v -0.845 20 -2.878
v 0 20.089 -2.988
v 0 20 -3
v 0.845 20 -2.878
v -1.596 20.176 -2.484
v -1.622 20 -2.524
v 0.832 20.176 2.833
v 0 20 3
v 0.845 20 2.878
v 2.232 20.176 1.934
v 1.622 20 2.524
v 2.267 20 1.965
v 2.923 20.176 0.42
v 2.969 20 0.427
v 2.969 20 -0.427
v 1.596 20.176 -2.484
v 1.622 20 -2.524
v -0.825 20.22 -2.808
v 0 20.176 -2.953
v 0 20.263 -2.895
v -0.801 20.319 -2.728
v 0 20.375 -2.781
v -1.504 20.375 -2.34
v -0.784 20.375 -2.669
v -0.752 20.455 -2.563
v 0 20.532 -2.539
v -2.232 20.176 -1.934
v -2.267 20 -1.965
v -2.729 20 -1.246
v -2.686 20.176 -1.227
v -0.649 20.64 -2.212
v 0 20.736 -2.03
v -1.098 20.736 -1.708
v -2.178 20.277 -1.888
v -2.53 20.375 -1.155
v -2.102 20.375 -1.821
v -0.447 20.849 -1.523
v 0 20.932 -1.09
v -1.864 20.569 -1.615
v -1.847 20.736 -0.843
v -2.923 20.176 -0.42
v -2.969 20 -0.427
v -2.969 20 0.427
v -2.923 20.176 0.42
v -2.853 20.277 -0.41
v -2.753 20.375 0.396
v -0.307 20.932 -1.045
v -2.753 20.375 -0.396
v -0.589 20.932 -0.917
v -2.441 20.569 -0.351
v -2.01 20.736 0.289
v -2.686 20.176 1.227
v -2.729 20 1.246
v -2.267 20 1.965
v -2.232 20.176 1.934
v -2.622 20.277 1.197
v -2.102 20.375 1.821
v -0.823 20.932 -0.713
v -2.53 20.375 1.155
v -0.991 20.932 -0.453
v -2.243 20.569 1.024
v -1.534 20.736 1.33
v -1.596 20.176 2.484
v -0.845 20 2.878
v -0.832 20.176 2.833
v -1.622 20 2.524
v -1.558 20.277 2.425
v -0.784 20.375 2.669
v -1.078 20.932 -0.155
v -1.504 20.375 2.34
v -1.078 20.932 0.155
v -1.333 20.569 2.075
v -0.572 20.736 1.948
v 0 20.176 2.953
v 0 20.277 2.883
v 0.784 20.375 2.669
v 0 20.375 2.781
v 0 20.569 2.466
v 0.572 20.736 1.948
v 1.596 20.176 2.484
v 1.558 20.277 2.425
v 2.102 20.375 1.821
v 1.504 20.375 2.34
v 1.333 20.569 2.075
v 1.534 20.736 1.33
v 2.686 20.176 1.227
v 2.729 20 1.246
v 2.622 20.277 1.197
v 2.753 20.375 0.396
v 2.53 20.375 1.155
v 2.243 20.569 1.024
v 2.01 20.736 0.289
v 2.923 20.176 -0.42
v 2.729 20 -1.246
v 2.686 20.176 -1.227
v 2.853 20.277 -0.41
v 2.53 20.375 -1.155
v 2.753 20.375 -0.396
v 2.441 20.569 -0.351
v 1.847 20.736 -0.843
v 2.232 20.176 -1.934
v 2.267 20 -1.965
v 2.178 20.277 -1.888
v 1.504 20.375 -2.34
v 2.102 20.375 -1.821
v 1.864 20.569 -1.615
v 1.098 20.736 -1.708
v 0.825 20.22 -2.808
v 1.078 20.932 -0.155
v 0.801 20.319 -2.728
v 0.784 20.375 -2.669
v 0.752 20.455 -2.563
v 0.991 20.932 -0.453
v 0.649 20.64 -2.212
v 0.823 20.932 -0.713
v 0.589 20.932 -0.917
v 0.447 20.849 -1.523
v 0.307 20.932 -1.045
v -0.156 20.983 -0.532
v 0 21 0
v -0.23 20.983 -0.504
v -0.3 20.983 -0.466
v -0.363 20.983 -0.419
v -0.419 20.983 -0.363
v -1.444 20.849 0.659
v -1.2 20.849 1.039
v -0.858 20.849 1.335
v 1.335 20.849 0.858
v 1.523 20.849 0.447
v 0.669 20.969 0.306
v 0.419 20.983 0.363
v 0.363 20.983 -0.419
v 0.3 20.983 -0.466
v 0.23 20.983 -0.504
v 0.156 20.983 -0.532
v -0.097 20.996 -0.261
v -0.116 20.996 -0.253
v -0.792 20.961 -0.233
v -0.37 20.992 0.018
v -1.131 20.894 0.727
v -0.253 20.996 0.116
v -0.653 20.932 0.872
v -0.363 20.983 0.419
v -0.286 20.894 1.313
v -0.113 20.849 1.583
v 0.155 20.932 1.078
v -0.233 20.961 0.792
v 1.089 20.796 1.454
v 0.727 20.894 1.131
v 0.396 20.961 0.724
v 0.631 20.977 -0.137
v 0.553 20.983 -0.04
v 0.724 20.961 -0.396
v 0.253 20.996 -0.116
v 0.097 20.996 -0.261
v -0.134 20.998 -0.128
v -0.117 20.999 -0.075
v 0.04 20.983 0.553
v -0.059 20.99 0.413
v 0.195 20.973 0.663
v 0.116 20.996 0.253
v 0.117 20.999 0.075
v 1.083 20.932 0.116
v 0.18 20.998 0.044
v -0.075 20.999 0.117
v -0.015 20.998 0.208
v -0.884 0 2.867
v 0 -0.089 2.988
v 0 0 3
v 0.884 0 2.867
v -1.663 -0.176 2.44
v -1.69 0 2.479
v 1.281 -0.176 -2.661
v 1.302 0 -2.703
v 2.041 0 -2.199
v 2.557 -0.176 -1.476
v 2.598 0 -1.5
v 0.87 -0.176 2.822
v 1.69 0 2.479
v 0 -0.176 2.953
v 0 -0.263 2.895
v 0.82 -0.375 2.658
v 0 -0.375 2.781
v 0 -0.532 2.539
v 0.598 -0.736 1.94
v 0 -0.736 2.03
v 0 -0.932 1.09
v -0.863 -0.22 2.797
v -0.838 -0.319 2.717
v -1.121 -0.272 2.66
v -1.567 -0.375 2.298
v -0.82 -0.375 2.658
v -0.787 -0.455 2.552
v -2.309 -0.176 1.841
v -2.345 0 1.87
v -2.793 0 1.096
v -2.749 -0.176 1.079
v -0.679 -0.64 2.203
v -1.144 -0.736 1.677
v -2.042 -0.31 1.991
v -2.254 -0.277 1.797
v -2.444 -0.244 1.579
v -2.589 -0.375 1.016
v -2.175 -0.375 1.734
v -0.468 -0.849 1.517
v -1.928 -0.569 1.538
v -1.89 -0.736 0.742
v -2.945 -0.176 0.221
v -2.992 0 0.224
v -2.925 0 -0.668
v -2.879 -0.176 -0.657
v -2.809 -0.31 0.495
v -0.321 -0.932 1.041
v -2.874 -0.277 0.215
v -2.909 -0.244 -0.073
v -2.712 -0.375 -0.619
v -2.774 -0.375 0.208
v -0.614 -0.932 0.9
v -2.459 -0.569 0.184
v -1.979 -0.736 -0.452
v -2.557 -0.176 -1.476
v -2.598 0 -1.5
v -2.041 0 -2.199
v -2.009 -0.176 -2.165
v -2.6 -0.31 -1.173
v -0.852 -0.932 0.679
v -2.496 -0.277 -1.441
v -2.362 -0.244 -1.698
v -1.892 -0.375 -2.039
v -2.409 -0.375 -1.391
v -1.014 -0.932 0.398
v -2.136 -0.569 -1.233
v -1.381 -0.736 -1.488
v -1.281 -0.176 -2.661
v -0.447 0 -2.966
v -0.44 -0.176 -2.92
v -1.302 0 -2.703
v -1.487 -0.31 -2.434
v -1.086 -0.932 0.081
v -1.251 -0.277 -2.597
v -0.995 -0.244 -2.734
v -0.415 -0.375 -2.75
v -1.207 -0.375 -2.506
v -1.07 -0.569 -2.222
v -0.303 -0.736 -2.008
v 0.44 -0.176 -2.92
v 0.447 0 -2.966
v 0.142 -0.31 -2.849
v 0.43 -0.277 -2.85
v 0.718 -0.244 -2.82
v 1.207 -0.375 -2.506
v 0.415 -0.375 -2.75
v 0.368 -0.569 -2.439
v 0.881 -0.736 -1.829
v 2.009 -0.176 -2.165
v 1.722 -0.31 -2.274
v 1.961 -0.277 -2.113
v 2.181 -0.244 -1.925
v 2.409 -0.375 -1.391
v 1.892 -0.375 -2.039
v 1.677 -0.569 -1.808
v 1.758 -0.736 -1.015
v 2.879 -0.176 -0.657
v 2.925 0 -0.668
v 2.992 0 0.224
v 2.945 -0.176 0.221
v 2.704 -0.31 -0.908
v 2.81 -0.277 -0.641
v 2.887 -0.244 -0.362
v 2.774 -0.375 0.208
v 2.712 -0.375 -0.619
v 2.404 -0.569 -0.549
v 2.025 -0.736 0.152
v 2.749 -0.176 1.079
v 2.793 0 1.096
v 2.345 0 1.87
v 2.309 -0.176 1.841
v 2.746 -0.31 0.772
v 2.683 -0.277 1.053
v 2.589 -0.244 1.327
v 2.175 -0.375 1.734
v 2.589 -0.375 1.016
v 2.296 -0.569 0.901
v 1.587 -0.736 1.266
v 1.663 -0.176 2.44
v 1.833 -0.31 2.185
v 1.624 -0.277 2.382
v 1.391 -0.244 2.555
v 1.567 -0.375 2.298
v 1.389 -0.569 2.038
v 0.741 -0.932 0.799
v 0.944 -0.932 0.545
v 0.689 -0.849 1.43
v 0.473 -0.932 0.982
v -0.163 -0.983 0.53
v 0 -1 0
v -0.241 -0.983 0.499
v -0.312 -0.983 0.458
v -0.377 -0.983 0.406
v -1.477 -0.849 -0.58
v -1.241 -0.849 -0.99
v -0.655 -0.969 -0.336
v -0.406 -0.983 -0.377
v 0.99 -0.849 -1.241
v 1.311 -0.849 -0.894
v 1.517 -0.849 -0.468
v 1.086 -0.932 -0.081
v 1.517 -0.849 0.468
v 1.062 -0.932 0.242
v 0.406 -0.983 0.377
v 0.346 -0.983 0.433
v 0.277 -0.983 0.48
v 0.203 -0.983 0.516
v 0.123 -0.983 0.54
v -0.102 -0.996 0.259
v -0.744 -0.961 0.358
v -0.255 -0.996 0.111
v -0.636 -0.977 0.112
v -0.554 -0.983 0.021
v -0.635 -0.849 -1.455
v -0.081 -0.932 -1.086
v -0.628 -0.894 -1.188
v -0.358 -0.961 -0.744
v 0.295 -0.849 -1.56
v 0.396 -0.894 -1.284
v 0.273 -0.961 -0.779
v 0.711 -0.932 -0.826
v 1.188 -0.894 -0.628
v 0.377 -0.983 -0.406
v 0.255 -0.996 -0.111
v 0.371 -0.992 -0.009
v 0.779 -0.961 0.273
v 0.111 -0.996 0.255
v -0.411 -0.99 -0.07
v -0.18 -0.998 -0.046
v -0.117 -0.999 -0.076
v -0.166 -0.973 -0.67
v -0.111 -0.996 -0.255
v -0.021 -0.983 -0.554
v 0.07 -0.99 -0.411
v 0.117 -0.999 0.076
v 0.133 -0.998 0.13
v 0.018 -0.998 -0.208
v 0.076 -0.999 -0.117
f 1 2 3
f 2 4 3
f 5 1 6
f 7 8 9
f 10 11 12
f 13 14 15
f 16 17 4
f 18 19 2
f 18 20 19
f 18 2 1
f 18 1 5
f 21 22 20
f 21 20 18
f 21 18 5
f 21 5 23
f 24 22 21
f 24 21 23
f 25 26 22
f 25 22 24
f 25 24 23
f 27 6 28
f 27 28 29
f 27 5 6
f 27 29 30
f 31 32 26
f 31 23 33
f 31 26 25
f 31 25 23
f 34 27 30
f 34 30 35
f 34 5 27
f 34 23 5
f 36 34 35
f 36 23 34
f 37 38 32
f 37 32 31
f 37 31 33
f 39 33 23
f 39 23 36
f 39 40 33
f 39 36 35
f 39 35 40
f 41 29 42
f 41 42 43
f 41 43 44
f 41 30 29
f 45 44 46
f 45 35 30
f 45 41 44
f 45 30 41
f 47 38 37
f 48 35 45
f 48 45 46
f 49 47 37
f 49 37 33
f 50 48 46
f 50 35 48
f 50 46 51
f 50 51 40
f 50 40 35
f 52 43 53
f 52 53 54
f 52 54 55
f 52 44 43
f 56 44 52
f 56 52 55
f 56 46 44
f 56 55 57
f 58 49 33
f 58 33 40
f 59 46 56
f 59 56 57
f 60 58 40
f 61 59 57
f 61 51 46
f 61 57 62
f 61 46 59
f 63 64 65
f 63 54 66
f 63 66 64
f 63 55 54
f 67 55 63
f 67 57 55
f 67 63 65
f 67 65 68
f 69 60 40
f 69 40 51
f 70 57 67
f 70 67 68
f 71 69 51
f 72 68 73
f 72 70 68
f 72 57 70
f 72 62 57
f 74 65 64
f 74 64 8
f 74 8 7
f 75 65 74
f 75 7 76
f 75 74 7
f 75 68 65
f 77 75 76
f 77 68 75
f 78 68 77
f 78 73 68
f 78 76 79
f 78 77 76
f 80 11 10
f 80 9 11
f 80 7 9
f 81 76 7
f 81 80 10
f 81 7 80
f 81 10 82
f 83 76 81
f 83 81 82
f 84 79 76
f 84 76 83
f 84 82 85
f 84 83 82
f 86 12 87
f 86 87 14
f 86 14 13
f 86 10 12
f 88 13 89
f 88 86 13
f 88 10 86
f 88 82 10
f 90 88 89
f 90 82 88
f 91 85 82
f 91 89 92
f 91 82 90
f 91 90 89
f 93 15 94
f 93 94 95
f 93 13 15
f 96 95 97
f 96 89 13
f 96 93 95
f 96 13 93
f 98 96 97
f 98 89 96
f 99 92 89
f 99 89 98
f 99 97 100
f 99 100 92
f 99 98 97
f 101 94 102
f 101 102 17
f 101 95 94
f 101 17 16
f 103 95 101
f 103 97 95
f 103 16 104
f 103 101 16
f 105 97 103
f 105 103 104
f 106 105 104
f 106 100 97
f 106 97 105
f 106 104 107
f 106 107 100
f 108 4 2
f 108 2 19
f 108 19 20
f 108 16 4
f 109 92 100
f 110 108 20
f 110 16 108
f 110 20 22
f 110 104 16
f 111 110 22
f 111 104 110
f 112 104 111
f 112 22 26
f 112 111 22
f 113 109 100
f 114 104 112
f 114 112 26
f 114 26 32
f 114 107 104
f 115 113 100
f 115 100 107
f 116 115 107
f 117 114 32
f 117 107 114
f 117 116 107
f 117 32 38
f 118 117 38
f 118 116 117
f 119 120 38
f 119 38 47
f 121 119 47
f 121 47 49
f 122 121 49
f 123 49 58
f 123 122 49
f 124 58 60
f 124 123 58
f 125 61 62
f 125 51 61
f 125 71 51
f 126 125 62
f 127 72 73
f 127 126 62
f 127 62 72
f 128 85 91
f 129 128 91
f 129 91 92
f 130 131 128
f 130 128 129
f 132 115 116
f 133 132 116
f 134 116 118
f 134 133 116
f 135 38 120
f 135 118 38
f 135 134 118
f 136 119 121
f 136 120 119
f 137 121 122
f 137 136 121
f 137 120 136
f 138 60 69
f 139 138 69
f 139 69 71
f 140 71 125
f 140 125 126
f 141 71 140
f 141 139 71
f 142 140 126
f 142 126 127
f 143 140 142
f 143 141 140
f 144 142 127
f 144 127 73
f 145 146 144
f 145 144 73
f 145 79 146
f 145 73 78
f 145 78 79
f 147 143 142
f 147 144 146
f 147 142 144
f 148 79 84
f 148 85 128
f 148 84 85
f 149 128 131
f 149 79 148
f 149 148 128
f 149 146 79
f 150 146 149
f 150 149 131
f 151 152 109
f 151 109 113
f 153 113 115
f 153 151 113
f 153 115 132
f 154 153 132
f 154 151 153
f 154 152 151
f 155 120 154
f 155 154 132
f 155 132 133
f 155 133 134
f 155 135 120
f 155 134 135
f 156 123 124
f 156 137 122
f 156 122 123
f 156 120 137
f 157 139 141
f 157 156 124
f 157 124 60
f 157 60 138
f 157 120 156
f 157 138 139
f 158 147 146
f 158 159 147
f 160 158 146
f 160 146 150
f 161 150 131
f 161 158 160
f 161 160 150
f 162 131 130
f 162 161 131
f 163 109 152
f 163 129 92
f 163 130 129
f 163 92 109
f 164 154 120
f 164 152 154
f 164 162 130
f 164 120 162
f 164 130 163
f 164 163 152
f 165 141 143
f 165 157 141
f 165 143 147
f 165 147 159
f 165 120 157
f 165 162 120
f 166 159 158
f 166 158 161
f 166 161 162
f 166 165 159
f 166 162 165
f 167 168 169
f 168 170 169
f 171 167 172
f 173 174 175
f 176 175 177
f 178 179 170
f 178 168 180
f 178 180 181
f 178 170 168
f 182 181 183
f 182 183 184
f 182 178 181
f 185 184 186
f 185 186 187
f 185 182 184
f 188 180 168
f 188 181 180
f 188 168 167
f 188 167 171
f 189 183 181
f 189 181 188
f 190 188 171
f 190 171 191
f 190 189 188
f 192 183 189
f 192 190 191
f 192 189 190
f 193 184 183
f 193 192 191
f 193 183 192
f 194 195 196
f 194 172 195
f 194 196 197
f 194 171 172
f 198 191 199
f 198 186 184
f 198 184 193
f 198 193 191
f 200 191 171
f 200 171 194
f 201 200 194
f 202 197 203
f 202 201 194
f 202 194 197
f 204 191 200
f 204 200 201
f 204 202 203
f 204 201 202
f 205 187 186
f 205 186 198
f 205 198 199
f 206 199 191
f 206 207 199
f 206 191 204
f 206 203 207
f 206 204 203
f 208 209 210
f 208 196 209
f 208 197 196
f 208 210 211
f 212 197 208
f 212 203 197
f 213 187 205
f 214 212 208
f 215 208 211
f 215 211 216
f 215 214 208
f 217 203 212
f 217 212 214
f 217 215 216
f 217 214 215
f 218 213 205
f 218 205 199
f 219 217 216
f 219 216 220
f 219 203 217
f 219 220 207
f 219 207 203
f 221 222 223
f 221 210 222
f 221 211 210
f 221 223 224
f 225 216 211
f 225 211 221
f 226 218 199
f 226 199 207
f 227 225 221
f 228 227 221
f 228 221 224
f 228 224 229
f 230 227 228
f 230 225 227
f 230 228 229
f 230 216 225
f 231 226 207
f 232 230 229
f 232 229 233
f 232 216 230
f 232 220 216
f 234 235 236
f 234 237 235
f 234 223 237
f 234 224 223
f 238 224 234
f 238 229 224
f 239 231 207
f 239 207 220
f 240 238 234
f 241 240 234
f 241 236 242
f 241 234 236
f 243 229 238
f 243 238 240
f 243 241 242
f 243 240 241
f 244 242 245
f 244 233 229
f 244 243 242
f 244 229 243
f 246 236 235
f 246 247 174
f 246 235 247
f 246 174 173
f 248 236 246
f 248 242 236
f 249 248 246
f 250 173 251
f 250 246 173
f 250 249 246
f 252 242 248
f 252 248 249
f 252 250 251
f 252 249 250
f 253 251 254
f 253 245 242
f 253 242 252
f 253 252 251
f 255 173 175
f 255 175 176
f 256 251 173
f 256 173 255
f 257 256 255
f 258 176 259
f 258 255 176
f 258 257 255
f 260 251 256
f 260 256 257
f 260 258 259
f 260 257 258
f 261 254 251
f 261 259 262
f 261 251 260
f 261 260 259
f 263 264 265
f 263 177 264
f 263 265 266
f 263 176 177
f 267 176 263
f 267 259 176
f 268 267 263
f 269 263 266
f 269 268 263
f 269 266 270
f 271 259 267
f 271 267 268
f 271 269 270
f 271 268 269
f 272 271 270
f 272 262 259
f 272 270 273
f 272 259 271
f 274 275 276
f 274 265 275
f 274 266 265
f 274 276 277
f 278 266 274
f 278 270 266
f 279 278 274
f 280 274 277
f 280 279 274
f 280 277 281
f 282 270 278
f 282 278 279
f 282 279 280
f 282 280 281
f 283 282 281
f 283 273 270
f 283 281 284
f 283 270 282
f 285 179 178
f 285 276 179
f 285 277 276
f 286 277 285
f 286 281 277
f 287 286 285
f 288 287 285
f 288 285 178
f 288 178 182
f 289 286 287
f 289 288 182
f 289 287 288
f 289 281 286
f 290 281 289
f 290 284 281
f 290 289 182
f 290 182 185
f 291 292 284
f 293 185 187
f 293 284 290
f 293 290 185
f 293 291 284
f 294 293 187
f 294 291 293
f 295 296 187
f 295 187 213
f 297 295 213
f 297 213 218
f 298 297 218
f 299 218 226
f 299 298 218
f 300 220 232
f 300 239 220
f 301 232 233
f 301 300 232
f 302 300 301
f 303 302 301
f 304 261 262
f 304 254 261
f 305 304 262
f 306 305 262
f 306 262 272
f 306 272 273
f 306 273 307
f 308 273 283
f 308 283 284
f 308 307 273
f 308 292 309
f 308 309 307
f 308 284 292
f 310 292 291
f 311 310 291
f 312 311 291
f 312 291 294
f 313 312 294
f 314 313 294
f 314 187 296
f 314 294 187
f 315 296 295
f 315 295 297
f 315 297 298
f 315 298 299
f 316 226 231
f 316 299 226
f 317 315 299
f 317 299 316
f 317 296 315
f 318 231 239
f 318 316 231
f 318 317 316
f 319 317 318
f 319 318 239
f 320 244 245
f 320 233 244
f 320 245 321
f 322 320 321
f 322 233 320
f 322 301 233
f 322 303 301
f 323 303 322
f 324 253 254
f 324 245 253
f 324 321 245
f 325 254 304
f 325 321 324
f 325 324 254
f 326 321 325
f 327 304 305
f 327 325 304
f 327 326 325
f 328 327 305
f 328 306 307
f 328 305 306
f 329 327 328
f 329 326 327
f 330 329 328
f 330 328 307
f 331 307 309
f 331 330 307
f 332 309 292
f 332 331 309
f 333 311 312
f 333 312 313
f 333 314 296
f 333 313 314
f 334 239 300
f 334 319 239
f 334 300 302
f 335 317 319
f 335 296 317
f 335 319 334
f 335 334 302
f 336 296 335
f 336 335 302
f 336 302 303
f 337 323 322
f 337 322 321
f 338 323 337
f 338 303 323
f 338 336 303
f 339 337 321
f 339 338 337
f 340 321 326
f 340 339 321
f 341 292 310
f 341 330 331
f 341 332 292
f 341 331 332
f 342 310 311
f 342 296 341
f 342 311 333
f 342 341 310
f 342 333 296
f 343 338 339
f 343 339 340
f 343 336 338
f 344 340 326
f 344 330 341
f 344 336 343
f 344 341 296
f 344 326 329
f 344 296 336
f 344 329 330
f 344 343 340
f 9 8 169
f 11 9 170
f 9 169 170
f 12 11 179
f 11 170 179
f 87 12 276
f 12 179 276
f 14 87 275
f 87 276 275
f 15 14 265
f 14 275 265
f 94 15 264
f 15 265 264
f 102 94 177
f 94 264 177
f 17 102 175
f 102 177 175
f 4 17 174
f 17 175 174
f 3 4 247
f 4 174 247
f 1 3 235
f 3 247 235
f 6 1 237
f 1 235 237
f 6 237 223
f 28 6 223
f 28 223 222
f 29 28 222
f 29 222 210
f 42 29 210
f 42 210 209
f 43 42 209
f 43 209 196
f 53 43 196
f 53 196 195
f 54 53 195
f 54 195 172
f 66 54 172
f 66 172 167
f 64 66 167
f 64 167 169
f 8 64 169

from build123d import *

# Parameters (mm, degrees)
ESQUISSE1_R        = 3
BOSS_EXTRU_1_DEPTH = 20
D_ME1_FACE_RADIUS  = 3
D_ME1_HEIGHT       = 1
D_ME2_FACE_RADIUS  = 3
D_ME2_HEIGHT       = 1


with BuildPart() as part:
    # Esquisse1 → Boss.-Extru.1 (new body)
    with BuildSketch(Plane(origin=(0, 0, 0), x_dir=(1, 0, 0), z_dir=(0, 1, 0))):
        Circle(ESQUISSE1_R)
    extrude(amount=BOSS_EXTRU_1_DEPTH)

    # Dôme1: an elliptical dome of height H over a round flat face of radius A is half a spheroid: the quarter ellipse of half axes A and H revolved about the face's axis
    with BuildSketch(Plane((0, 20, 0), x_dir=(0, 0, -1), z_dir=(1, 0, 0)), mode=Mode.PRIVATE) as d_me1_quarter:
        Ellipse(D_ME1_FACE_RADIUS, D_ME1_HEIGHT)
        Rectangle(D_ME1_FACE_RADIUS, D_ME1_HEIGHT, align=(Align.MIN, Align.MIN), mode=Mode.INTERSECT)
    revolve(d_me1_quarter.sketch, axis=Axis((0, 20, 0), (0, 1, 0)))

    # Dôme2: an elliptical dome of height H over a round flat face of radius A is half a spheroid: the quarter ellipse of half axes A and H revolved about the face's axis
    with BuildSketch(Plane((0, 0, 0), x_dir=(0, 0, 1), z_dir=(1, 0, 0)), mode=Mode.PRIVATE) as d_me2_quarter:
        Ellipse(D_ME2_FACE_RADIUS, D_ME2_HEIGHT)
        Rectangle(D_ME2_FACE_RADIUS, D_ME2_HEIGHT, align=(Align.MIN, Align.MIN), mode=Mode.INTERSECT)
    revolve(d_me2_quarter.sketch, axis=Axis((0, 0, 0), (0, -1, 0)))


solid = part.part
